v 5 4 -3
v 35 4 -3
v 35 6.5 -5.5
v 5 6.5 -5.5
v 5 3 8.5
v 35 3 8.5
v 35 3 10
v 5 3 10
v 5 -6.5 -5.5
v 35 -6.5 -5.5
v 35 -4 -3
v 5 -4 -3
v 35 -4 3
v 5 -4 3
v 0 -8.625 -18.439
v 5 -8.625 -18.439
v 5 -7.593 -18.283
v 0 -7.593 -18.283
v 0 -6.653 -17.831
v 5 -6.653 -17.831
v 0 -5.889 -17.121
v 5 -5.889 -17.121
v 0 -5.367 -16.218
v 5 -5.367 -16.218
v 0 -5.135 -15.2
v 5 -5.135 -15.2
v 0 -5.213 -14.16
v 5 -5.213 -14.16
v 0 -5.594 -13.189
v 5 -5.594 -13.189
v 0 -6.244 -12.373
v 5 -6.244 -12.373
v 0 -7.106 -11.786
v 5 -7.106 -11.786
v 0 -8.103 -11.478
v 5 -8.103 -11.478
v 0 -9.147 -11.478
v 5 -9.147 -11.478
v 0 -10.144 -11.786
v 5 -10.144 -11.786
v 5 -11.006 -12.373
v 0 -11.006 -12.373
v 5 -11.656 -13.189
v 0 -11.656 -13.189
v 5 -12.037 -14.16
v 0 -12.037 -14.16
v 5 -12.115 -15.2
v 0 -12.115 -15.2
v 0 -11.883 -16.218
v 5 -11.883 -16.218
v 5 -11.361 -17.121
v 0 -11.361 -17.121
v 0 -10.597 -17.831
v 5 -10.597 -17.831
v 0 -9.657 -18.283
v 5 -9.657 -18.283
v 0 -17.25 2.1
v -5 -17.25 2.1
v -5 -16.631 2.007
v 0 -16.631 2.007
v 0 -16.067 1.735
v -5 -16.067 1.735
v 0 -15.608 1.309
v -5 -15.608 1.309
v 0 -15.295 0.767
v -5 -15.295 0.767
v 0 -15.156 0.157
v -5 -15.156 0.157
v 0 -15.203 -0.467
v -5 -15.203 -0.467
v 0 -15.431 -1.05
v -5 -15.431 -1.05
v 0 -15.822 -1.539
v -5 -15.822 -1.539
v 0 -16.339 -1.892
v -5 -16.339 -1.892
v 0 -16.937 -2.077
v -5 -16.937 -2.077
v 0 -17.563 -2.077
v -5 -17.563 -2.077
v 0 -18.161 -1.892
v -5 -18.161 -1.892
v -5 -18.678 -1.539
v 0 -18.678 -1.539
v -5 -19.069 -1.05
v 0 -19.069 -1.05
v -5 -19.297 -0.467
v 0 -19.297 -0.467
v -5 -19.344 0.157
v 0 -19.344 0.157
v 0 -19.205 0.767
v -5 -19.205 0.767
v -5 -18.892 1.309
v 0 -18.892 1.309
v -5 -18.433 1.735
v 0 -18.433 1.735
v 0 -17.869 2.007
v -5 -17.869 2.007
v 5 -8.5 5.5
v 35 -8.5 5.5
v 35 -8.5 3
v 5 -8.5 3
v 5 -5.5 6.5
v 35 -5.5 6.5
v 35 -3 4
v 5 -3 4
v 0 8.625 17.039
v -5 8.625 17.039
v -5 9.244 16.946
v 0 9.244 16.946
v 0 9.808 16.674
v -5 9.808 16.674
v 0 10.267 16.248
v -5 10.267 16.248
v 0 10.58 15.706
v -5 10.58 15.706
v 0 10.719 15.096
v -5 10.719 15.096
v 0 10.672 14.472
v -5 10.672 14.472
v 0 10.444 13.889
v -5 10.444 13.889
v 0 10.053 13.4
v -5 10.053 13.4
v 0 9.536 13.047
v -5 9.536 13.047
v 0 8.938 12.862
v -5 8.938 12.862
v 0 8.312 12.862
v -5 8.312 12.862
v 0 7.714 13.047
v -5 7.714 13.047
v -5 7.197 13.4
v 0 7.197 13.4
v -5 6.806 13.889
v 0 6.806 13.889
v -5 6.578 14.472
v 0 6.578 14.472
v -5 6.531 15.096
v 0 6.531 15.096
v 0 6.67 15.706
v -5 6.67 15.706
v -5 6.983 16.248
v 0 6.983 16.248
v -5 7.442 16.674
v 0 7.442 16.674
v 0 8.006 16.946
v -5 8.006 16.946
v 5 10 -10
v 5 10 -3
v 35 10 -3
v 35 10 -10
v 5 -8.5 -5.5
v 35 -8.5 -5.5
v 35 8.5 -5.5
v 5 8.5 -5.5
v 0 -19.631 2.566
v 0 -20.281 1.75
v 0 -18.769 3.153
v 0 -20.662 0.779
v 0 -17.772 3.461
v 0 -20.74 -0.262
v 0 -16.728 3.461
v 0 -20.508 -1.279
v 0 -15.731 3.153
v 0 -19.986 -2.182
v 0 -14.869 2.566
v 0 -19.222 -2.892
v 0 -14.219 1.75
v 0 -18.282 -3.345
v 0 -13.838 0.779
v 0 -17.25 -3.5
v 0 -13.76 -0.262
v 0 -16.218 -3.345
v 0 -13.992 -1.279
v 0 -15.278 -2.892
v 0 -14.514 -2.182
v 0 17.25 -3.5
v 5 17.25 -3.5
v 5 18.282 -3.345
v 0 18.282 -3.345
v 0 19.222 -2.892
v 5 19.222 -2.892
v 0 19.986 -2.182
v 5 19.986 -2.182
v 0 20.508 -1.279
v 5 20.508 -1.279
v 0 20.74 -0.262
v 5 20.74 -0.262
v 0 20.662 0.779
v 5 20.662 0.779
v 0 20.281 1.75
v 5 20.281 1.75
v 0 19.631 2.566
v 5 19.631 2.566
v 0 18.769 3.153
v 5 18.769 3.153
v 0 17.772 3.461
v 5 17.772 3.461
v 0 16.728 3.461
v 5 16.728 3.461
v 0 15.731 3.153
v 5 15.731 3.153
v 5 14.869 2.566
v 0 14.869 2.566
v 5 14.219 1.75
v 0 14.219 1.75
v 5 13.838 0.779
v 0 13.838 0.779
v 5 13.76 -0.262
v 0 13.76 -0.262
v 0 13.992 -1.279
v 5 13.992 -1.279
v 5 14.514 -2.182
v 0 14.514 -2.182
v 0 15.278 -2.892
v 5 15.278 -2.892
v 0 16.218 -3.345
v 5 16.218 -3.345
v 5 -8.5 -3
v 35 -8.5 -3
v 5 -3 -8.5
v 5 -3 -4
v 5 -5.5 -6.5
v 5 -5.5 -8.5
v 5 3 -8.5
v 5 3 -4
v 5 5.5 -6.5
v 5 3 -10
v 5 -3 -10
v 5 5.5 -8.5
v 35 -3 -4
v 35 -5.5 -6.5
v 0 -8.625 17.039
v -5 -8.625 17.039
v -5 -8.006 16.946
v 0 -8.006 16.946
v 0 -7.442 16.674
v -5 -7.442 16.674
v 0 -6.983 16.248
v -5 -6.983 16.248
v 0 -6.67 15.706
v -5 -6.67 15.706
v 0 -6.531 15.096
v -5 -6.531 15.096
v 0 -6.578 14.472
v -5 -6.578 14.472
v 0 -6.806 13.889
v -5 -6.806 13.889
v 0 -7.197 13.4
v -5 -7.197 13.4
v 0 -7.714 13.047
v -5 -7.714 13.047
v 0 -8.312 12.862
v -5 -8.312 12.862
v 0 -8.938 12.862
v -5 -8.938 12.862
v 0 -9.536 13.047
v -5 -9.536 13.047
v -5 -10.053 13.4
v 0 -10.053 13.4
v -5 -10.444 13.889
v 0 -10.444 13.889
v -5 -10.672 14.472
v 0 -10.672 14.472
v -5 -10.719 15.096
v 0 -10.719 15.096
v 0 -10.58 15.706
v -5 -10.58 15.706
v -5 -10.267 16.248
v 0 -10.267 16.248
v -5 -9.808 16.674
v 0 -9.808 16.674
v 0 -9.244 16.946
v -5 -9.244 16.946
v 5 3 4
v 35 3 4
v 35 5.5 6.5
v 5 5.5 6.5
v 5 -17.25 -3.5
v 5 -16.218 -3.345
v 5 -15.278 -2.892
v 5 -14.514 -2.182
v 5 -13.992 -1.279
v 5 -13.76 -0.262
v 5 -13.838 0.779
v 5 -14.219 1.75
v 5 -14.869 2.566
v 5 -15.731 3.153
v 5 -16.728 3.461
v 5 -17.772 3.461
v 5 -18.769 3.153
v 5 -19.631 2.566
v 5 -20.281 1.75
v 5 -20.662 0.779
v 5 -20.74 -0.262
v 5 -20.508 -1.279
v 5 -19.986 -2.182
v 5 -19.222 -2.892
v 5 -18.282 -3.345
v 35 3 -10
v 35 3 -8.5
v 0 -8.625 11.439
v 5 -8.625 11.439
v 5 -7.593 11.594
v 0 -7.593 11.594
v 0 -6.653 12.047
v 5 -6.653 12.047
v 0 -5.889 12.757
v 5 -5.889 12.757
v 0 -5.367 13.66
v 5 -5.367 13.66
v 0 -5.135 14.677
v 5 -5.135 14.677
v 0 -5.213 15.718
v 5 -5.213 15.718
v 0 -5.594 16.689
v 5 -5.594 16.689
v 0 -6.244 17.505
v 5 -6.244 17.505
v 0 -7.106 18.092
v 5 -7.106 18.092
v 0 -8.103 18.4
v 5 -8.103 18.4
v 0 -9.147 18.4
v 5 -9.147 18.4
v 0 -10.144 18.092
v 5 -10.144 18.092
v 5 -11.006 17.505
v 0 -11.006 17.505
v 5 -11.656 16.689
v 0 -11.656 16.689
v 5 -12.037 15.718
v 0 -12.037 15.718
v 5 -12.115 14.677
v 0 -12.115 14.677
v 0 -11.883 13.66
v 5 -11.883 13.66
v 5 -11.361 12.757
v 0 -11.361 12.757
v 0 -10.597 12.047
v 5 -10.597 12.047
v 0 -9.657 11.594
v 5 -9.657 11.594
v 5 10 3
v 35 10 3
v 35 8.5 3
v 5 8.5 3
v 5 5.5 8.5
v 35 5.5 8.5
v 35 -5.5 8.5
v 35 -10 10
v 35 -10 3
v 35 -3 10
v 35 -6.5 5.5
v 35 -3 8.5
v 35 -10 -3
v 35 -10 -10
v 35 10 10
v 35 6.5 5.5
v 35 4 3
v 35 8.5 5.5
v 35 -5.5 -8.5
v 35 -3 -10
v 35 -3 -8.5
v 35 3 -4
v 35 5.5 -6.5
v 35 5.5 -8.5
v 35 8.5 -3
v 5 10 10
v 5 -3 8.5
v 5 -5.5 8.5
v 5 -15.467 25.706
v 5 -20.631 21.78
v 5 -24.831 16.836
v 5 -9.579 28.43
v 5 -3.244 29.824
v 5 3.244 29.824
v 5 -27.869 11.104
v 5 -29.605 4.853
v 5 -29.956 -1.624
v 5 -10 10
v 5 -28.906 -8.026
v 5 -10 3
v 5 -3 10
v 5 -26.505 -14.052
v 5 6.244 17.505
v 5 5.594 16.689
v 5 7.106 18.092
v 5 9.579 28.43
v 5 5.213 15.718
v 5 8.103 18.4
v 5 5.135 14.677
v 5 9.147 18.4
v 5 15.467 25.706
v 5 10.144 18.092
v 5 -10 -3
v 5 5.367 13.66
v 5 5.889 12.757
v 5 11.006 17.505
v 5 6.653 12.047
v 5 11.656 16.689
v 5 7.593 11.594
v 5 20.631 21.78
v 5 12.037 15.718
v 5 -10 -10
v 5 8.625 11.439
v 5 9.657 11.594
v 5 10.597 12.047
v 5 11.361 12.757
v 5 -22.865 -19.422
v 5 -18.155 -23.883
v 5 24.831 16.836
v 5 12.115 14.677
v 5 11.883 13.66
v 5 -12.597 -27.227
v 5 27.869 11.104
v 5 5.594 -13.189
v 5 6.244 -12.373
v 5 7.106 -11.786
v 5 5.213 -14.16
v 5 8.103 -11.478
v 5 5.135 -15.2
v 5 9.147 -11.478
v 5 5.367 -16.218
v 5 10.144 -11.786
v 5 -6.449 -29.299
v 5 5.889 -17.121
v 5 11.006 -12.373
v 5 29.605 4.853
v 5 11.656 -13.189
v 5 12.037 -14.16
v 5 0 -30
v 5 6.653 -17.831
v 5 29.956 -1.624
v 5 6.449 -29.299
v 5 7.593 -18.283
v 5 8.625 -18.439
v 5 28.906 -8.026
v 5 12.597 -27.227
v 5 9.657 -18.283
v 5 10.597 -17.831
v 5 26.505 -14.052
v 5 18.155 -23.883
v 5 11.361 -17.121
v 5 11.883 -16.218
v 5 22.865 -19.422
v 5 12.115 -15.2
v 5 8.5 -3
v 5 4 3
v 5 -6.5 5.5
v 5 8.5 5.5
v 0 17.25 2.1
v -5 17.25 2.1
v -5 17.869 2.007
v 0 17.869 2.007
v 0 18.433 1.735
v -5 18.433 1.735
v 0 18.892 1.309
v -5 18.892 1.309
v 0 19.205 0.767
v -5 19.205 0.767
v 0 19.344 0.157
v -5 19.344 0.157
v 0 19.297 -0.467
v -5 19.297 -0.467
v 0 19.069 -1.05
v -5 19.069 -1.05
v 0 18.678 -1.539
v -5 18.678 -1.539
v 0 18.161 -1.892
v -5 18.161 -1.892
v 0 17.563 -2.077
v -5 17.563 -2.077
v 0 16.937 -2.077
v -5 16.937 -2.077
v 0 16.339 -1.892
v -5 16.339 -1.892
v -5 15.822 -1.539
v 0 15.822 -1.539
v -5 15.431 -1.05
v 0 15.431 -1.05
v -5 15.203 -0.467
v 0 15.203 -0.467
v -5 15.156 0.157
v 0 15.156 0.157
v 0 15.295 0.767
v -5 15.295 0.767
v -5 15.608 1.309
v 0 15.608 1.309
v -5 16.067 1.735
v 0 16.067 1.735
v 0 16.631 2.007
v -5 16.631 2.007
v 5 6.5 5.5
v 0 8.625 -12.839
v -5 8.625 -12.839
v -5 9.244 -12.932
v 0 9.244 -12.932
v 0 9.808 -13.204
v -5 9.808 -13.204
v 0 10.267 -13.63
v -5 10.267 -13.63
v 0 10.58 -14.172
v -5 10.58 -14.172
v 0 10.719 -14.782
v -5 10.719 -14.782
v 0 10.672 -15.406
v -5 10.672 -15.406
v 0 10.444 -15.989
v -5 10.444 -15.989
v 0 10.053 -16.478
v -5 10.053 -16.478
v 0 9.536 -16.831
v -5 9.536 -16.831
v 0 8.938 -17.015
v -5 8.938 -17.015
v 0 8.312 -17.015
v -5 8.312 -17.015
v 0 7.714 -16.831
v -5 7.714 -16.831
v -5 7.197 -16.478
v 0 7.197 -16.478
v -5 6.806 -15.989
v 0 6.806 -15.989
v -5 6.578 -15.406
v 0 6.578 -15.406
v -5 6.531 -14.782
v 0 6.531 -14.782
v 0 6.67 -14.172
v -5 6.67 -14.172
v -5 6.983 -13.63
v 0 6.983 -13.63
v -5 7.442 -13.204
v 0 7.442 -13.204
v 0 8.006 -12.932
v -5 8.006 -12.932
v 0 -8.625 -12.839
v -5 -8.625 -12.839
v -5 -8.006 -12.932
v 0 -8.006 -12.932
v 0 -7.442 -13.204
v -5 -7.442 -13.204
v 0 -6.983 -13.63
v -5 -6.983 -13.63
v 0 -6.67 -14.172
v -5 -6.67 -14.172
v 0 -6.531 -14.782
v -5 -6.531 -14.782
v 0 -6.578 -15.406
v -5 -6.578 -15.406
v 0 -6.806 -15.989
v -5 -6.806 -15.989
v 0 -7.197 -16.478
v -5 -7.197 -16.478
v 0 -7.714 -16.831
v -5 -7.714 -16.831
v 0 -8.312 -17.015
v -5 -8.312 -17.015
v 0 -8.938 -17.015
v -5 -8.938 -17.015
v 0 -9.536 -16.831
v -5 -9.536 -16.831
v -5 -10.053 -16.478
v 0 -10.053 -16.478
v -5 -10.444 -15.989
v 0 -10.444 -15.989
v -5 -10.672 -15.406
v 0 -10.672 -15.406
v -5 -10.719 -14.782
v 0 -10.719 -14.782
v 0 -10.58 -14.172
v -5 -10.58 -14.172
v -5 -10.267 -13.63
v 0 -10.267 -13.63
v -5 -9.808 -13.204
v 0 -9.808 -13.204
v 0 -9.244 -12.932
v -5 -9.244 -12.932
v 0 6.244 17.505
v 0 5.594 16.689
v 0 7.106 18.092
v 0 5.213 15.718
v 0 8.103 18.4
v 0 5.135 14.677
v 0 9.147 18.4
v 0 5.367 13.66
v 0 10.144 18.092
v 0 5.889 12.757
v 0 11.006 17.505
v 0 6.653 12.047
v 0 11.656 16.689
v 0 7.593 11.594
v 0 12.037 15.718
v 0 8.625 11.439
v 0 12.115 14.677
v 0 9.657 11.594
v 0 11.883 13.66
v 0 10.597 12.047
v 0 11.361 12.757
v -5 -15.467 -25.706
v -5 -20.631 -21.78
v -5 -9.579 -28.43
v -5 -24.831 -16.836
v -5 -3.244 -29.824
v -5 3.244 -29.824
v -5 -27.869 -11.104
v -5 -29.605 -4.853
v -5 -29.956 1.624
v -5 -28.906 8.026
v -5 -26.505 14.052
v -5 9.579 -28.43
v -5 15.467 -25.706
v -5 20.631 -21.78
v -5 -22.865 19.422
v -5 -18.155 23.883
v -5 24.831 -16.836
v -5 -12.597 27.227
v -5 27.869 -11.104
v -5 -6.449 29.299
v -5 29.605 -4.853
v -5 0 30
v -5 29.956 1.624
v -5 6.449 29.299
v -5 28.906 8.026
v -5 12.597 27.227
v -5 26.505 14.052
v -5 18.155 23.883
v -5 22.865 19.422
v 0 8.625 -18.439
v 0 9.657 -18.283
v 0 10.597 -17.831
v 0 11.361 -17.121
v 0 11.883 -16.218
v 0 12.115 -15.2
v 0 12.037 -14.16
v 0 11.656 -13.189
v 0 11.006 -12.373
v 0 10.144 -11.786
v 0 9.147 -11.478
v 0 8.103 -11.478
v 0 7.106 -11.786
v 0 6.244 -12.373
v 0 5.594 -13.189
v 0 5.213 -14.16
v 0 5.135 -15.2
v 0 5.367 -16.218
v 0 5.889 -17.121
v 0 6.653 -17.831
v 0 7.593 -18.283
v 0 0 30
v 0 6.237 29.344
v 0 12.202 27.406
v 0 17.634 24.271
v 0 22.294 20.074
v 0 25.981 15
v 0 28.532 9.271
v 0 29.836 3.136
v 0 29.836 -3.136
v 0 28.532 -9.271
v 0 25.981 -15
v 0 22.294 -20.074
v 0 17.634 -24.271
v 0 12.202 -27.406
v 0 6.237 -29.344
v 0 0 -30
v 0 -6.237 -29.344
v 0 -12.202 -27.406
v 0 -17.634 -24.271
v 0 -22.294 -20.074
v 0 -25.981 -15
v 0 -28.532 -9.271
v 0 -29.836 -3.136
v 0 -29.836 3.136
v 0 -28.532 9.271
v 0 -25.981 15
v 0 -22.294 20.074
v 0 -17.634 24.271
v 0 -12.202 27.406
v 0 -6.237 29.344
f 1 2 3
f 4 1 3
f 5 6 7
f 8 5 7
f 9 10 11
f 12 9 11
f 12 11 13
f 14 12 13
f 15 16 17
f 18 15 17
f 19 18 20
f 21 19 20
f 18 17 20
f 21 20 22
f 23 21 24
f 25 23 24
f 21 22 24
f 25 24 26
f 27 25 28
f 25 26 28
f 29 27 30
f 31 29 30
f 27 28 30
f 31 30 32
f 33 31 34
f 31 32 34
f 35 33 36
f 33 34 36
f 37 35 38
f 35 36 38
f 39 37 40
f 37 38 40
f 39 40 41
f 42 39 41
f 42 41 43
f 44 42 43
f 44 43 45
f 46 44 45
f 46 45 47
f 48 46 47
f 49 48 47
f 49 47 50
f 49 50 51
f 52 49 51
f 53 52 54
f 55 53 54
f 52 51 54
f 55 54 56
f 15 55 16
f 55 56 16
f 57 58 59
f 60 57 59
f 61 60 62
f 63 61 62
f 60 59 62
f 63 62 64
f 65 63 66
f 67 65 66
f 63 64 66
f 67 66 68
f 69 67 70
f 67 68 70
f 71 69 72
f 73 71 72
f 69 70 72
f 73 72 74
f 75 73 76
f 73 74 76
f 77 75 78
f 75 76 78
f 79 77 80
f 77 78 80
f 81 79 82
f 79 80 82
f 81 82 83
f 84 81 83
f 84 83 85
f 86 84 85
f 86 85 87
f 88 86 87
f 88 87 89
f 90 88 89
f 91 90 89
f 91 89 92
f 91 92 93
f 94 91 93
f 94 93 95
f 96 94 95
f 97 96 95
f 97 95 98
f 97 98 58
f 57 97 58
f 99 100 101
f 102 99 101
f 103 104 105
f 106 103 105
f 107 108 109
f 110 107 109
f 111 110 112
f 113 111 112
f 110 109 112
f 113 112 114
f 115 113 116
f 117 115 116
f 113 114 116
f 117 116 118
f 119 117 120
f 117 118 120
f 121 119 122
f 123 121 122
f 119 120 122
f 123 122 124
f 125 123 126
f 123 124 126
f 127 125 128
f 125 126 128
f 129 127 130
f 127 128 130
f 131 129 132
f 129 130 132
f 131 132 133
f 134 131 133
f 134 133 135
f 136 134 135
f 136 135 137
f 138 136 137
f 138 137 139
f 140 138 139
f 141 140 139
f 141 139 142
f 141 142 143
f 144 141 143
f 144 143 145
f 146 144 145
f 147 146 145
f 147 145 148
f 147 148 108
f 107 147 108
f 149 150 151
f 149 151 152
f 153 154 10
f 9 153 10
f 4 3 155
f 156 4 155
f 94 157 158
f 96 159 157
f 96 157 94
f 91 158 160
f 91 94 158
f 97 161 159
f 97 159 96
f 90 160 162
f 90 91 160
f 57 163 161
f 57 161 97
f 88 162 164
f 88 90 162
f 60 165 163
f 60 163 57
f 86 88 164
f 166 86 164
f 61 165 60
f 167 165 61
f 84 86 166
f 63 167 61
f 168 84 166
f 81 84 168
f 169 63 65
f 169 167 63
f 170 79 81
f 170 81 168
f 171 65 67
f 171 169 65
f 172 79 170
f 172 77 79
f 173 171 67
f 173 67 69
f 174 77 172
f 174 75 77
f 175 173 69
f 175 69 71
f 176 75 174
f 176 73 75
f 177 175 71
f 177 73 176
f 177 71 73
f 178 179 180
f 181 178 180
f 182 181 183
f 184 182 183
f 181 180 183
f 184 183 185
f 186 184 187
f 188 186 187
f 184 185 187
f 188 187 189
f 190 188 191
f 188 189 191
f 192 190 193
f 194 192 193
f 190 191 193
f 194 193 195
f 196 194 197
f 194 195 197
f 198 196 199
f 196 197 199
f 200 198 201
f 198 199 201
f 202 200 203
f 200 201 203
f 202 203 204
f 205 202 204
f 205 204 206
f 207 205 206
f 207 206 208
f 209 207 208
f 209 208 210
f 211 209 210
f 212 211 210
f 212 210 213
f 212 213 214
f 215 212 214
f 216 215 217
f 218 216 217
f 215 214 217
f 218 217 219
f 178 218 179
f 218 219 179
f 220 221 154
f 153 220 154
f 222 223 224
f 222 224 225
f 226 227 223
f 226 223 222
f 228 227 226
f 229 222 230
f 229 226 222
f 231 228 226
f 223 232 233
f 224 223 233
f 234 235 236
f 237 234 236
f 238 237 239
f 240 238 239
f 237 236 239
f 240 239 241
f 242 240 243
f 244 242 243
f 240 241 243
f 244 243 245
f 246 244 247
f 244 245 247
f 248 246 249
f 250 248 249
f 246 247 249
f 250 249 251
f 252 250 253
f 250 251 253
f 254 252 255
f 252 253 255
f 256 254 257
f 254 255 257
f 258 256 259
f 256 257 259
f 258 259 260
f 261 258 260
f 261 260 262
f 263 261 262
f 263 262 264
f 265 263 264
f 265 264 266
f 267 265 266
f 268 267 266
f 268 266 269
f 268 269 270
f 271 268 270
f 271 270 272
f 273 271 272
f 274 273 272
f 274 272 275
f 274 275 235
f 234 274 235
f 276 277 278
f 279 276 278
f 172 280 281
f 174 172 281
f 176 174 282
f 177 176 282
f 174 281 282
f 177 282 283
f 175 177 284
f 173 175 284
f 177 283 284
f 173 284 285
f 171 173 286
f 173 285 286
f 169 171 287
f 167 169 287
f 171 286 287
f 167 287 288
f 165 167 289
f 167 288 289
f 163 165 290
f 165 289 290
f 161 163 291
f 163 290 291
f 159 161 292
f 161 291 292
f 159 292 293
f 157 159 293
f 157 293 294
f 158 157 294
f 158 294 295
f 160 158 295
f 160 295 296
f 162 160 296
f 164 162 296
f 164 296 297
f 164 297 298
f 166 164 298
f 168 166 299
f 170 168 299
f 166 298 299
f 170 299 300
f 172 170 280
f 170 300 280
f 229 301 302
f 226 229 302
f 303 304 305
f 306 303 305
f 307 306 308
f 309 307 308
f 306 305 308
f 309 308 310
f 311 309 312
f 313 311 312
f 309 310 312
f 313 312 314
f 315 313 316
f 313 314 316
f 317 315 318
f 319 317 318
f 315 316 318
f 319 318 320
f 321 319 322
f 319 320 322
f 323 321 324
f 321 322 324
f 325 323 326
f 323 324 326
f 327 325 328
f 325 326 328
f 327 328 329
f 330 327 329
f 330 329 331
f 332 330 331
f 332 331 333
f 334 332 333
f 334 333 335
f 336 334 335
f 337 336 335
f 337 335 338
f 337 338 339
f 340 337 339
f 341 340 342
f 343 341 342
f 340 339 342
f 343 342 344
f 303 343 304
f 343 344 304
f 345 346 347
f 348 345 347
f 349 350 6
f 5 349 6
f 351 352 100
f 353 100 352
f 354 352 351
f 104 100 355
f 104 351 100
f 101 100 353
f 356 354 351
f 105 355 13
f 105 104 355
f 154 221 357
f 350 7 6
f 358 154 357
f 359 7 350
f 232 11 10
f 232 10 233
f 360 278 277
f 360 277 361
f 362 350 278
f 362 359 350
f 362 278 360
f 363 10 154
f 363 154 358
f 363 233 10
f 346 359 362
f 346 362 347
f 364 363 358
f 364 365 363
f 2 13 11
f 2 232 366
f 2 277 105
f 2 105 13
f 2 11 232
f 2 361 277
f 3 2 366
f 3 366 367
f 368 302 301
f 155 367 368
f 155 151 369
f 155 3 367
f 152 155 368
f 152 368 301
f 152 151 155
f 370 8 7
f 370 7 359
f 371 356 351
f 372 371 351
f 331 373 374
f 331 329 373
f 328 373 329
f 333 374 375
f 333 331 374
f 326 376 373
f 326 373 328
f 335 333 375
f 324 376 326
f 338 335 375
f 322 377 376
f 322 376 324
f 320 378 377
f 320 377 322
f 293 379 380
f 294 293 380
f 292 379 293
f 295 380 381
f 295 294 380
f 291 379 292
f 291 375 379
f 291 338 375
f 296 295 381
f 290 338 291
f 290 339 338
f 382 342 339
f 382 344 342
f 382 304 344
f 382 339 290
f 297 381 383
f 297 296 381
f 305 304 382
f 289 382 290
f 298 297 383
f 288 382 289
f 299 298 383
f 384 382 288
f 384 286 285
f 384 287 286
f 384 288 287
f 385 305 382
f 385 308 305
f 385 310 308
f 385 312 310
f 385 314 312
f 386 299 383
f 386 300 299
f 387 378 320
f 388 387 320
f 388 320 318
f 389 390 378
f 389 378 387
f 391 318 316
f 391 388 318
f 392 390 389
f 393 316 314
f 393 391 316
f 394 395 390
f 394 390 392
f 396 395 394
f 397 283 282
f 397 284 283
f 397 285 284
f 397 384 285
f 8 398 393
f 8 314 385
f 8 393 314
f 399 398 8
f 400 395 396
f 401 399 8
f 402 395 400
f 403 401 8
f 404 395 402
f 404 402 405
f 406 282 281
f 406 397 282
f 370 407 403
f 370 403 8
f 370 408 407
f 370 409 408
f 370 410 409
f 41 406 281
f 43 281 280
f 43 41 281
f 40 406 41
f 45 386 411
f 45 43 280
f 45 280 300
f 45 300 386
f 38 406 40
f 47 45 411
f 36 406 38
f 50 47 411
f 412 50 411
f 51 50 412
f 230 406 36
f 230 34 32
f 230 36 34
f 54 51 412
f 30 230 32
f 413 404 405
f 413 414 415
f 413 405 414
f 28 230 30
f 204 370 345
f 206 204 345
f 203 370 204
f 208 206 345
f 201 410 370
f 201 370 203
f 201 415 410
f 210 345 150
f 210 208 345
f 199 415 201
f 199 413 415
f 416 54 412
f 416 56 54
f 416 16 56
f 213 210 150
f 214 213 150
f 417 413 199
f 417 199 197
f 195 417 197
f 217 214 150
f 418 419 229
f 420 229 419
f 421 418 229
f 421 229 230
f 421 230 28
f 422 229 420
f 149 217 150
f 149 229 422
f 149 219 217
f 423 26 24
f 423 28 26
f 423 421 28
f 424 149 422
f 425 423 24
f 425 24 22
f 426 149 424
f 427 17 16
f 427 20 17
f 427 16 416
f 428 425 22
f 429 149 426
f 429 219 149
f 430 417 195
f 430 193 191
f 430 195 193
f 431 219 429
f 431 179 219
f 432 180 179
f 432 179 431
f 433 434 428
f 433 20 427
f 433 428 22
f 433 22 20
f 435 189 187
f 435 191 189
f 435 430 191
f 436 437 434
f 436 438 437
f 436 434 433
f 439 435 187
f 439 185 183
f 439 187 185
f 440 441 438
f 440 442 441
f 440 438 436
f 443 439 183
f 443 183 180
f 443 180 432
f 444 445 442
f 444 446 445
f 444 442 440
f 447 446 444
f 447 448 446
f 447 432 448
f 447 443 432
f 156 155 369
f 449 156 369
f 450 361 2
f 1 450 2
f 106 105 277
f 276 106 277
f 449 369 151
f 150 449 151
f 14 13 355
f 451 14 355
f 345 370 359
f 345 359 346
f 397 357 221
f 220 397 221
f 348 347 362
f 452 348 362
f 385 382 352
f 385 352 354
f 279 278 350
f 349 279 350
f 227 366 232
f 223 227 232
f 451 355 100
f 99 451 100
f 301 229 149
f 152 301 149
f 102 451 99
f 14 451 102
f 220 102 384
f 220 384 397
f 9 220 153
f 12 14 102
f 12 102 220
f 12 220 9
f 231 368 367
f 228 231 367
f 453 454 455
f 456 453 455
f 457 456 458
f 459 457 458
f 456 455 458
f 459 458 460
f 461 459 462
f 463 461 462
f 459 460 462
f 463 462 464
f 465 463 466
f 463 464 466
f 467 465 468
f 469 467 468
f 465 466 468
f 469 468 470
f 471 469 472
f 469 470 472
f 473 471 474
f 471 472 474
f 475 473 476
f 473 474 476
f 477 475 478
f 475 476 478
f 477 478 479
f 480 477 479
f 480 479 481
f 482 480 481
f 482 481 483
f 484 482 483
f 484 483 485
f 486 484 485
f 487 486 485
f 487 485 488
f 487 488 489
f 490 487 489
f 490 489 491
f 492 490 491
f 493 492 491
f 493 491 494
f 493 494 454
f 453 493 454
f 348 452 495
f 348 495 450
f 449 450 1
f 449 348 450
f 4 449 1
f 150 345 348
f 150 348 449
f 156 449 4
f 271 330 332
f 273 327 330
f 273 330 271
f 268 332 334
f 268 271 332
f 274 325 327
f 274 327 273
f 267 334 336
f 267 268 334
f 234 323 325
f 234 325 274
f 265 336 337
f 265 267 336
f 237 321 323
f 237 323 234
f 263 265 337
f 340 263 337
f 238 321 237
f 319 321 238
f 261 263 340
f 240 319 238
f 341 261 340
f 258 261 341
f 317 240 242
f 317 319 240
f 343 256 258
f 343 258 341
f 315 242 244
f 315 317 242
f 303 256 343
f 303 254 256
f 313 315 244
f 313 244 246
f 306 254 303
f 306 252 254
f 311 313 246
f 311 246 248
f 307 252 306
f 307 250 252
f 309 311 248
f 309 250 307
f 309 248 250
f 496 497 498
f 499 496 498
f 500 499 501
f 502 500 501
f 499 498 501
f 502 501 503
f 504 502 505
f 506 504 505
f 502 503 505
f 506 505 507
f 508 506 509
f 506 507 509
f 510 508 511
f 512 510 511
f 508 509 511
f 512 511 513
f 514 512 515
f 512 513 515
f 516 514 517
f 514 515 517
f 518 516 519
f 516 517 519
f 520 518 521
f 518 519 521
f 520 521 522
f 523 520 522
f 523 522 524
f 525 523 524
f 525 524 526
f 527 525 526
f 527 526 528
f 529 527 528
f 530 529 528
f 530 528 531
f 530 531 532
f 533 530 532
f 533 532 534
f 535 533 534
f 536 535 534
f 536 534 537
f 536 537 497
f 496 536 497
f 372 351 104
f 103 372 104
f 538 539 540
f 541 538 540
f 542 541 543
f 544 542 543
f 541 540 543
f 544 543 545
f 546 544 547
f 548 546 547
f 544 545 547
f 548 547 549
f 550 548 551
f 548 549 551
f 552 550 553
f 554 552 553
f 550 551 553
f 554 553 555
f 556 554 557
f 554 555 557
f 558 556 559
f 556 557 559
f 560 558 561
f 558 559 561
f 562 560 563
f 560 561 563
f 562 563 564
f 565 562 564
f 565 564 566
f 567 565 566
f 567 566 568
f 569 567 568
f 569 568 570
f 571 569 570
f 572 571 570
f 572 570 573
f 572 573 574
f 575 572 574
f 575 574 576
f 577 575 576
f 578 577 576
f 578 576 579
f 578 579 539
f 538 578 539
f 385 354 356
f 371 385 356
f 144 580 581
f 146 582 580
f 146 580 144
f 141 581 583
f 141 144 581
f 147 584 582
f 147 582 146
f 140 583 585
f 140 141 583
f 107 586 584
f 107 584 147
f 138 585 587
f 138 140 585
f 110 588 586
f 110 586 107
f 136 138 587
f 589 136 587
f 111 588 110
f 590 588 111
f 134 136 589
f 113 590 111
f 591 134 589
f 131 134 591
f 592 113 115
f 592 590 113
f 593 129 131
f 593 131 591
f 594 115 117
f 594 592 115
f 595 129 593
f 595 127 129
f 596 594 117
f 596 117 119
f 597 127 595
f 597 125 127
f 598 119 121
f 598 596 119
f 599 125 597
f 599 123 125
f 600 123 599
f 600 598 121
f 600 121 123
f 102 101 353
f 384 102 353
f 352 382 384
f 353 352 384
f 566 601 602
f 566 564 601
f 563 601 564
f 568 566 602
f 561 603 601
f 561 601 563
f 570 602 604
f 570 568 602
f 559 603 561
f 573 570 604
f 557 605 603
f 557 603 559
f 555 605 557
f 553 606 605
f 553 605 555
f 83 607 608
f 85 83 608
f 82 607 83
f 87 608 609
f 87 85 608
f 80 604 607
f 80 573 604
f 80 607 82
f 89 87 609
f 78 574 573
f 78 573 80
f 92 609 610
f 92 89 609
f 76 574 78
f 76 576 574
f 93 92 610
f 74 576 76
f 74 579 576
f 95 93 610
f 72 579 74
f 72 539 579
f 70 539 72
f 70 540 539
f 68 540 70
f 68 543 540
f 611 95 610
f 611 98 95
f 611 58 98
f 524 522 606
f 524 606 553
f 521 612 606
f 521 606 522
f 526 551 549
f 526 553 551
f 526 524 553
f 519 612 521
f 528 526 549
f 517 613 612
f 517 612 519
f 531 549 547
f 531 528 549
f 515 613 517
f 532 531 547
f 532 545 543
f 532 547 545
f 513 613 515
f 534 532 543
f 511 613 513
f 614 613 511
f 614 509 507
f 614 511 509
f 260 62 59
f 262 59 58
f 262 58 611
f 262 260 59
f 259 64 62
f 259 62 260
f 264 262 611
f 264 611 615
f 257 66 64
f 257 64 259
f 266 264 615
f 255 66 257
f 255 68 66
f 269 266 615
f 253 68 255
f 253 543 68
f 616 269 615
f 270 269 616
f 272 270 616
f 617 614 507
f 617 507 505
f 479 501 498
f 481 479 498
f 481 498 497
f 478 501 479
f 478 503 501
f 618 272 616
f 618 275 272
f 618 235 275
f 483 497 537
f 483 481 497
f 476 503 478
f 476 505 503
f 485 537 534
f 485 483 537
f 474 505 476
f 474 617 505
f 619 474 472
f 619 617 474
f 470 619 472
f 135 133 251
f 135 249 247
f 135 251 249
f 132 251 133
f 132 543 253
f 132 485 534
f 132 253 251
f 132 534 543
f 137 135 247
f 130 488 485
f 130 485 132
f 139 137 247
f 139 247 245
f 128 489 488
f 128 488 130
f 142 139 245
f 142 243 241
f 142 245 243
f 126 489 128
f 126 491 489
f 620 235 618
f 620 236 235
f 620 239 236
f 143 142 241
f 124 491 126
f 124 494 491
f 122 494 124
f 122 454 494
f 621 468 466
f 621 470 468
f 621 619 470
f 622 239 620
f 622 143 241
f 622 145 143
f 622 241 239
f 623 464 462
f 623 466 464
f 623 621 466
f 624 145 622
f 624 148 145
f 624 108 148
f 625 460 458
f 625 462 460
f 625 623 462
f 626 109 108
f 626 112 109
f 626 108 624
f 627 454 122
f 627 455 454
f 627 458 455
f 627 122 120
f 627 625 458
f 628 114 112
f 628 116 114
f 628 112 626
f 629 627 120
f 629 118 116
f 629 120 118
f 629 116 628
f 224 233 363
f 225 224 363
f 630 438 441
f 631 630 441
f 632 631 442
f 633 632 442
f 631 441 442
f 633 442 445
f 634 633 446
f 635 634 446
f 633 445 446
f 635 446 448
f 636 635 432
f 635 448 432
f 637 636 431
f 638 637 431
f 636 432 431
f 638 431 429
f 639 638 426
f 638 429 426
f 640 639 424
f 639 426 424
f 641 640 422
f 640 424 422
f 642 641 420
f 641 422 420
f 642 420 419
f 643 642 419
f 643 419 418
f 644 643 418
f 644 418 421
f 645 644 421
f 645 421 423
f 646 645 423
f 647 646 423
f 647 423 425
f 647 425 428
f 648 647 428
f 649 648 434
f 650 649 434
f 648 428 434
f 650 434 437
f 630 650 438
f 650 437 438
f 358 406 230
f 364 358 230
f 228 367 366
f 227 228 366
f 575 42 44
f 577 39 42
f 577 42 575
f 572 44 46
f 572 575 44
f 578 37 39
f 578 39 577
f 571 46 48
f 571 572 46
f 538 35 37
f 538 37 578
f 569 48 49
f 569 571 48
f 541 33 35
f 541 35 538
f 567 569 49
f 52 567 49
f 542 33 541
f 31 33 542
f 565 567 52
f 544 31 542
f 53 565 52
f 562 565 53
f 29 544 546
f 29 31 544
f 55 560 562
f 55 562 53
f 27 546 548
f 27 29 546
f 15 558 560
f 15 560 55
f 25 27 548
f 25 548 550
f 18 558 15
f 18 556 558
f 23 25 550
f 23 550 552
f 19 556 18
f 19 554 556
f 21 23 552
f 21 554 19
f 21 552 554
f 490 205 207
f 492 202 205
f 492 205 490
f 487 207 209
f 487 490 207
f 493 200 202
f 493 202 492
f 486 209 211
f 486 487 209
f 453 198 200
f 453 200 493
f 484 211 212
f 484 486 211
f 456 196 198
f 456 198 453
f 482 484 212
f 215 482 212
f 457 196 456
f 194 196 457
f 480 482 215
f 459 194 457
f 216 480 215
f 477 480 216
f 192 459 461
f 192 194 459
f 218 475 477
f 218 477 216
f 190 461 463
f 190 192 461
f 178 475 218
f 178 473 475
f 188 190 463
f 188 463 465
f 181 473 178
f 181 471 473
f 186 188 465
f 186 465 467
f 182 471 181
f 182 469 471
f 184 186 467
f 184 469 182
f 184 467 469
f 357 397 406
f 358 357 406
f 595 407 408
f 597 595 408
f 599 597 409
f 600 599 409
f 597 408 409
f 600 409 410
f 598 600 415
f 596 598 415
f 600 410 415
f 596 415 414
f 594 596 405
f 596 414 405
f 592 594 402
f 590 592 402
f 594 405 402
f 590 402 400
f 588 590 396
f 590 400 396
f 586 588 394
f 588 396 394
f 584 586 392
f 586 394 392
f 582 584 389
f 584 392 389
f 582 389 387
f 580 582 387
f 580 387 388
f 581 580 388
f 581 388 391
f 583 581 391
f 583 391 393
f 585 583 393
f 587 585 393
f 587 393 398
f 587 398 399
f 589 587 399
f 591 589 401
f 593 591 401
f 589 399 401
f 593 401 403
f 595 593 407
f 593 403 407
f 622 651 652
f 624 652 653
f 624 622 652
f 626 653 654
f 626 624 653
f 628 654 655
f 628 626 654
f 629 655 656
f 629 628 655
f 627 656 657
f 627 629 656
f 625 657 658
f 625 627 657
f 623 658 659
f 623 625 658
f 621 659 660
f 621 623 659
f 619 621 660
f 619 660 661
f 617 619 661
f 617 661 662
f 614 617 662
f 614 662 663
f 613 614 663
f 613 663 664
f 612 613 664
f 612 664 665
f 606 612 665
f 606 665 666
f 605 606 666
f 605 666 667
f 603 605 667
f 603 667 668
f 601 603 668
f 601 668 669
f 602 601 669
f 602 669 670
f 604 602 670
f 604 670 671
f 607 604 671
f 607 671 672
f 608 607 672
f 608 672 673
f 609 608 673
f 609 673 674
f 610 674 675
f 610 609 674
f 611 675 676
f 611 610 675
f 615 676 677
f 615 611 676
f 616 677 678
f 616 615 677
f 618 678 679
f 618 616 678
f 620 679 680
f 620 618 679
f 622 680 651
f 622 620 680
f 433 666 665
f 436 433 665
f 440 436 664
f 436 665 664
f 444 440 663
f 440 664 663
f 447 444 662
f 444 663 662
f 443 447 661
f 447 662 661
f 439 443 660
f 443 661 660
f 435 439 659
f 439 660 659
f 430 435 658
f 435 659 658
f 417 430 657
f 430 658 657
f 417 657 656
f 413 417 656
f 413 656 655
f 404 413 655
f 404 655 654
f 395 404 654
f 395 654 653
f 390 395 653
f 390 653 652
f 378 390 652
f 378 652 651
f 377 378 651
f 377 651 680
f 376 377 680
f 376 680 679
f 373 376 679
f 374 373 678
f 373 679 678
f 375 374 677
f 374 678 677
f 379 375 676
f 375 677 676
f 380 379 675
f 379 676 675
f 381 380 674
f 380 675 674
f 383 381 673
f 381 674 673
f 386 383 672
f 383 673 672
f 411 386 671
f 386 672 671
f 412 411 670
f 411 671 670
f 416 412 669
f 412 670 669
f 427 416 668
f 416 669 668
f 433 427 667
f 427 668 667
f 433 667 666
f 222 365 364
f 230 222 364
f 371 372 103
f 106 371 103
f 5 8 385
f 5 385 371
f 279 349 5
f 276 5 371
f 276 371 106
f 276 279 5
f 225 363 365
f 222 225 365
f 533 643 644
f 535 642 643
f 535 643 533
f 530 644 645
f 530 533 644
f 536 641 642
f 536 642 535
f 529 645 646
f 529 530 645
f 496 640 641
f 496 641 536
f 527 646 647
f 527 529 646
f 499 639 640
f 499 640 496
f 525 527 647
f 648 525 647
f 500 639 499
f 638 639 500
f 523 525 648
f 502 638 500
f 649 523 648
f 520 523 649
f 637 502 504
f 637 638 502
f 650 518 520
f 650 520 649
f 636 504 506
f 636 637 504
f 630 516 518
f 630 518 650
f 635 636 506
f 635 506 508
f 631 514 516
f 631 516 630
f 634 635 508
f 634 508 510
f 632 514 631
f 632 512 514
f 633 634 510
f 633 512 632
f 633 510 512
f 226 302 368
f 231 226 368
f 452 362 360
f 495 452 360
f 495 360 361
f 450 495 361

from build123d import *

# Parameters (mm, degrees)
SKETCH_1_R          = 30
EXTRUDE_1_DEPTH     = 5
SKETCH_2_W          = 20
SKETCH_2_H          = 20
EXTRUDE_2_DEPTH     = 30
EXTRUDE_START       = 5
SKETCH_4_R          = 30
EXTRUDE_3_DEPTH     = 5
CUT_EXTRUDE_1_DEPTH = 30
SKETCH_7_R          = 2.1
CUT_EXTRUDE_2_DEPTH = 30
SKETCH_8_R          = 3.5
CUT_EXTRUDE_3_DEPTH = 5


with BuildPart() as part:
    # 草图1 → 凸台-拉伸1 (new body)
    with BuildSketch(Plane(origin=(0, 0, 0), x_dir=(0, 0, -1), z_dir=(1, 0, 0))):
        Circle(SKETCH_1_R)
    extrude(amount=EXTRUDE_1_DEPTH)

    # 草图2 → 凸台-拉伸2 (add)
    with BuildSketch(Plane(origin=(5, 0, 0), x_dir=(0, 0, -1), z_dir=(1, 0, 0))):
        Rectangle(SKETCH_2_W, SKETCH_2_H)
    extrude(amount=EXTRUDE_2_DEPTH)

    # 草图4 → 凸台-拉伸3 (add)
    with BuildSketch(Plane.ZY.offset(EXTRUDE_START)):
        Circle(SKETCH_4_R)
    extrude(amount=-EXTRUDE_3_DEPTH)

    # 草图5 → 切除-拉伸1 (cut)
    with BuildSketch(Plane(origin=(35, 0, 0), x_dir=(0, 0, -1), z_dir=(1, 0, 0))):
        Polygon((-10, 3), (-10, 0), (-4, 0), (-4, 3), (-6.5, 5.5), (-8.5, 5.5), (-8.5, 3), align=None)
        Polygon((-4, 0), (-10, 0), (-10, -3), (-8.5, -3), (-8.5, -5.5), (-6.5, -5.5), (-4, -3), align=None)
        Polygon((-3, -8.5), (-3, -10), (3, -10), (3, -8.5), (5.5, -8.5), (5.5, -6.5), (3, -4), (-3, -4), (-5.5, -6.5), (-5.5, -8.5), align=None)
        Polygon((10, -3), (10, 3), (8.5, 3), (8.5, 5.5), (6.5, 5.5), (4, 3), (4, -3), (6.5, -5.5), (8.5, -5.5), (8.5, -3), align=None)
        Polygon((3, 10), (-3, 10), (-3, 8.5), (-5.5, 8.5), (-5.5, 6.5), (-3, 4), (3, 4), (5.5, 6.5), (5.5, 8.5), (3, 8.5), align=None)
    extrude(amount=-CUT_EXTRUDE_1_DEPTH, mode=Mode.SUBTRACT)

    # 草图7 → 切除-拉伸2 (cut)
    with BuildSketch(Plane.ZY.offset(5)):
        with Locations((0, -17.25)):
            Circle(SKETCH_7_R)
        with Locations((-14.938938215, -8.625)):
            Circle(SKETCH_7_R)
        with Locations((-14.938938215, 8.625)):
            Circle(SKETCH_7_R)
        with Locations((0, 17.25)):
            Circle(SKETCH_7_R)
        with Locations((14.938938215, 8.625)):
            Circle(SKETCH_7_R)
        with Locations((14.938938215, -8.625)):
            Circle(SKETCH_7_R)
    extrude(amount=-CUT_EXTRUDE_2_DEPTH, mode=Mode.SUBTRACT)

    # 草图8 → 切除-拉伸3 (cut)
    with BuildSketch(Plane(origin=(5, 0, 0), x_dir=(0, 0, -1), z_dir=(1, 0, 0))):
        with Locations((-14.938938215, 8.625)):
            Circle(SKETCH_8_R)
        with Locations((0, 17.25)):
            Circle(SKETCH_8_R)
        with Locations((14.938938215, 8.625)):
            Circle(SKETCH_8_R)
        with Locations((14.938938215, -8.625)):
            Circle(SKETCH_8_R)
        with Locations((0, -17.25)):
            Circle(SKETCH_8_R)
        with Locations((-14.938938215, -8.625)):
            Circle(SKETCH_8_R)
    extrude(amount=-CUT_EXTRUDE_3_DEPTH, mode=Mode.SUBTRACT)


solid = part.part
